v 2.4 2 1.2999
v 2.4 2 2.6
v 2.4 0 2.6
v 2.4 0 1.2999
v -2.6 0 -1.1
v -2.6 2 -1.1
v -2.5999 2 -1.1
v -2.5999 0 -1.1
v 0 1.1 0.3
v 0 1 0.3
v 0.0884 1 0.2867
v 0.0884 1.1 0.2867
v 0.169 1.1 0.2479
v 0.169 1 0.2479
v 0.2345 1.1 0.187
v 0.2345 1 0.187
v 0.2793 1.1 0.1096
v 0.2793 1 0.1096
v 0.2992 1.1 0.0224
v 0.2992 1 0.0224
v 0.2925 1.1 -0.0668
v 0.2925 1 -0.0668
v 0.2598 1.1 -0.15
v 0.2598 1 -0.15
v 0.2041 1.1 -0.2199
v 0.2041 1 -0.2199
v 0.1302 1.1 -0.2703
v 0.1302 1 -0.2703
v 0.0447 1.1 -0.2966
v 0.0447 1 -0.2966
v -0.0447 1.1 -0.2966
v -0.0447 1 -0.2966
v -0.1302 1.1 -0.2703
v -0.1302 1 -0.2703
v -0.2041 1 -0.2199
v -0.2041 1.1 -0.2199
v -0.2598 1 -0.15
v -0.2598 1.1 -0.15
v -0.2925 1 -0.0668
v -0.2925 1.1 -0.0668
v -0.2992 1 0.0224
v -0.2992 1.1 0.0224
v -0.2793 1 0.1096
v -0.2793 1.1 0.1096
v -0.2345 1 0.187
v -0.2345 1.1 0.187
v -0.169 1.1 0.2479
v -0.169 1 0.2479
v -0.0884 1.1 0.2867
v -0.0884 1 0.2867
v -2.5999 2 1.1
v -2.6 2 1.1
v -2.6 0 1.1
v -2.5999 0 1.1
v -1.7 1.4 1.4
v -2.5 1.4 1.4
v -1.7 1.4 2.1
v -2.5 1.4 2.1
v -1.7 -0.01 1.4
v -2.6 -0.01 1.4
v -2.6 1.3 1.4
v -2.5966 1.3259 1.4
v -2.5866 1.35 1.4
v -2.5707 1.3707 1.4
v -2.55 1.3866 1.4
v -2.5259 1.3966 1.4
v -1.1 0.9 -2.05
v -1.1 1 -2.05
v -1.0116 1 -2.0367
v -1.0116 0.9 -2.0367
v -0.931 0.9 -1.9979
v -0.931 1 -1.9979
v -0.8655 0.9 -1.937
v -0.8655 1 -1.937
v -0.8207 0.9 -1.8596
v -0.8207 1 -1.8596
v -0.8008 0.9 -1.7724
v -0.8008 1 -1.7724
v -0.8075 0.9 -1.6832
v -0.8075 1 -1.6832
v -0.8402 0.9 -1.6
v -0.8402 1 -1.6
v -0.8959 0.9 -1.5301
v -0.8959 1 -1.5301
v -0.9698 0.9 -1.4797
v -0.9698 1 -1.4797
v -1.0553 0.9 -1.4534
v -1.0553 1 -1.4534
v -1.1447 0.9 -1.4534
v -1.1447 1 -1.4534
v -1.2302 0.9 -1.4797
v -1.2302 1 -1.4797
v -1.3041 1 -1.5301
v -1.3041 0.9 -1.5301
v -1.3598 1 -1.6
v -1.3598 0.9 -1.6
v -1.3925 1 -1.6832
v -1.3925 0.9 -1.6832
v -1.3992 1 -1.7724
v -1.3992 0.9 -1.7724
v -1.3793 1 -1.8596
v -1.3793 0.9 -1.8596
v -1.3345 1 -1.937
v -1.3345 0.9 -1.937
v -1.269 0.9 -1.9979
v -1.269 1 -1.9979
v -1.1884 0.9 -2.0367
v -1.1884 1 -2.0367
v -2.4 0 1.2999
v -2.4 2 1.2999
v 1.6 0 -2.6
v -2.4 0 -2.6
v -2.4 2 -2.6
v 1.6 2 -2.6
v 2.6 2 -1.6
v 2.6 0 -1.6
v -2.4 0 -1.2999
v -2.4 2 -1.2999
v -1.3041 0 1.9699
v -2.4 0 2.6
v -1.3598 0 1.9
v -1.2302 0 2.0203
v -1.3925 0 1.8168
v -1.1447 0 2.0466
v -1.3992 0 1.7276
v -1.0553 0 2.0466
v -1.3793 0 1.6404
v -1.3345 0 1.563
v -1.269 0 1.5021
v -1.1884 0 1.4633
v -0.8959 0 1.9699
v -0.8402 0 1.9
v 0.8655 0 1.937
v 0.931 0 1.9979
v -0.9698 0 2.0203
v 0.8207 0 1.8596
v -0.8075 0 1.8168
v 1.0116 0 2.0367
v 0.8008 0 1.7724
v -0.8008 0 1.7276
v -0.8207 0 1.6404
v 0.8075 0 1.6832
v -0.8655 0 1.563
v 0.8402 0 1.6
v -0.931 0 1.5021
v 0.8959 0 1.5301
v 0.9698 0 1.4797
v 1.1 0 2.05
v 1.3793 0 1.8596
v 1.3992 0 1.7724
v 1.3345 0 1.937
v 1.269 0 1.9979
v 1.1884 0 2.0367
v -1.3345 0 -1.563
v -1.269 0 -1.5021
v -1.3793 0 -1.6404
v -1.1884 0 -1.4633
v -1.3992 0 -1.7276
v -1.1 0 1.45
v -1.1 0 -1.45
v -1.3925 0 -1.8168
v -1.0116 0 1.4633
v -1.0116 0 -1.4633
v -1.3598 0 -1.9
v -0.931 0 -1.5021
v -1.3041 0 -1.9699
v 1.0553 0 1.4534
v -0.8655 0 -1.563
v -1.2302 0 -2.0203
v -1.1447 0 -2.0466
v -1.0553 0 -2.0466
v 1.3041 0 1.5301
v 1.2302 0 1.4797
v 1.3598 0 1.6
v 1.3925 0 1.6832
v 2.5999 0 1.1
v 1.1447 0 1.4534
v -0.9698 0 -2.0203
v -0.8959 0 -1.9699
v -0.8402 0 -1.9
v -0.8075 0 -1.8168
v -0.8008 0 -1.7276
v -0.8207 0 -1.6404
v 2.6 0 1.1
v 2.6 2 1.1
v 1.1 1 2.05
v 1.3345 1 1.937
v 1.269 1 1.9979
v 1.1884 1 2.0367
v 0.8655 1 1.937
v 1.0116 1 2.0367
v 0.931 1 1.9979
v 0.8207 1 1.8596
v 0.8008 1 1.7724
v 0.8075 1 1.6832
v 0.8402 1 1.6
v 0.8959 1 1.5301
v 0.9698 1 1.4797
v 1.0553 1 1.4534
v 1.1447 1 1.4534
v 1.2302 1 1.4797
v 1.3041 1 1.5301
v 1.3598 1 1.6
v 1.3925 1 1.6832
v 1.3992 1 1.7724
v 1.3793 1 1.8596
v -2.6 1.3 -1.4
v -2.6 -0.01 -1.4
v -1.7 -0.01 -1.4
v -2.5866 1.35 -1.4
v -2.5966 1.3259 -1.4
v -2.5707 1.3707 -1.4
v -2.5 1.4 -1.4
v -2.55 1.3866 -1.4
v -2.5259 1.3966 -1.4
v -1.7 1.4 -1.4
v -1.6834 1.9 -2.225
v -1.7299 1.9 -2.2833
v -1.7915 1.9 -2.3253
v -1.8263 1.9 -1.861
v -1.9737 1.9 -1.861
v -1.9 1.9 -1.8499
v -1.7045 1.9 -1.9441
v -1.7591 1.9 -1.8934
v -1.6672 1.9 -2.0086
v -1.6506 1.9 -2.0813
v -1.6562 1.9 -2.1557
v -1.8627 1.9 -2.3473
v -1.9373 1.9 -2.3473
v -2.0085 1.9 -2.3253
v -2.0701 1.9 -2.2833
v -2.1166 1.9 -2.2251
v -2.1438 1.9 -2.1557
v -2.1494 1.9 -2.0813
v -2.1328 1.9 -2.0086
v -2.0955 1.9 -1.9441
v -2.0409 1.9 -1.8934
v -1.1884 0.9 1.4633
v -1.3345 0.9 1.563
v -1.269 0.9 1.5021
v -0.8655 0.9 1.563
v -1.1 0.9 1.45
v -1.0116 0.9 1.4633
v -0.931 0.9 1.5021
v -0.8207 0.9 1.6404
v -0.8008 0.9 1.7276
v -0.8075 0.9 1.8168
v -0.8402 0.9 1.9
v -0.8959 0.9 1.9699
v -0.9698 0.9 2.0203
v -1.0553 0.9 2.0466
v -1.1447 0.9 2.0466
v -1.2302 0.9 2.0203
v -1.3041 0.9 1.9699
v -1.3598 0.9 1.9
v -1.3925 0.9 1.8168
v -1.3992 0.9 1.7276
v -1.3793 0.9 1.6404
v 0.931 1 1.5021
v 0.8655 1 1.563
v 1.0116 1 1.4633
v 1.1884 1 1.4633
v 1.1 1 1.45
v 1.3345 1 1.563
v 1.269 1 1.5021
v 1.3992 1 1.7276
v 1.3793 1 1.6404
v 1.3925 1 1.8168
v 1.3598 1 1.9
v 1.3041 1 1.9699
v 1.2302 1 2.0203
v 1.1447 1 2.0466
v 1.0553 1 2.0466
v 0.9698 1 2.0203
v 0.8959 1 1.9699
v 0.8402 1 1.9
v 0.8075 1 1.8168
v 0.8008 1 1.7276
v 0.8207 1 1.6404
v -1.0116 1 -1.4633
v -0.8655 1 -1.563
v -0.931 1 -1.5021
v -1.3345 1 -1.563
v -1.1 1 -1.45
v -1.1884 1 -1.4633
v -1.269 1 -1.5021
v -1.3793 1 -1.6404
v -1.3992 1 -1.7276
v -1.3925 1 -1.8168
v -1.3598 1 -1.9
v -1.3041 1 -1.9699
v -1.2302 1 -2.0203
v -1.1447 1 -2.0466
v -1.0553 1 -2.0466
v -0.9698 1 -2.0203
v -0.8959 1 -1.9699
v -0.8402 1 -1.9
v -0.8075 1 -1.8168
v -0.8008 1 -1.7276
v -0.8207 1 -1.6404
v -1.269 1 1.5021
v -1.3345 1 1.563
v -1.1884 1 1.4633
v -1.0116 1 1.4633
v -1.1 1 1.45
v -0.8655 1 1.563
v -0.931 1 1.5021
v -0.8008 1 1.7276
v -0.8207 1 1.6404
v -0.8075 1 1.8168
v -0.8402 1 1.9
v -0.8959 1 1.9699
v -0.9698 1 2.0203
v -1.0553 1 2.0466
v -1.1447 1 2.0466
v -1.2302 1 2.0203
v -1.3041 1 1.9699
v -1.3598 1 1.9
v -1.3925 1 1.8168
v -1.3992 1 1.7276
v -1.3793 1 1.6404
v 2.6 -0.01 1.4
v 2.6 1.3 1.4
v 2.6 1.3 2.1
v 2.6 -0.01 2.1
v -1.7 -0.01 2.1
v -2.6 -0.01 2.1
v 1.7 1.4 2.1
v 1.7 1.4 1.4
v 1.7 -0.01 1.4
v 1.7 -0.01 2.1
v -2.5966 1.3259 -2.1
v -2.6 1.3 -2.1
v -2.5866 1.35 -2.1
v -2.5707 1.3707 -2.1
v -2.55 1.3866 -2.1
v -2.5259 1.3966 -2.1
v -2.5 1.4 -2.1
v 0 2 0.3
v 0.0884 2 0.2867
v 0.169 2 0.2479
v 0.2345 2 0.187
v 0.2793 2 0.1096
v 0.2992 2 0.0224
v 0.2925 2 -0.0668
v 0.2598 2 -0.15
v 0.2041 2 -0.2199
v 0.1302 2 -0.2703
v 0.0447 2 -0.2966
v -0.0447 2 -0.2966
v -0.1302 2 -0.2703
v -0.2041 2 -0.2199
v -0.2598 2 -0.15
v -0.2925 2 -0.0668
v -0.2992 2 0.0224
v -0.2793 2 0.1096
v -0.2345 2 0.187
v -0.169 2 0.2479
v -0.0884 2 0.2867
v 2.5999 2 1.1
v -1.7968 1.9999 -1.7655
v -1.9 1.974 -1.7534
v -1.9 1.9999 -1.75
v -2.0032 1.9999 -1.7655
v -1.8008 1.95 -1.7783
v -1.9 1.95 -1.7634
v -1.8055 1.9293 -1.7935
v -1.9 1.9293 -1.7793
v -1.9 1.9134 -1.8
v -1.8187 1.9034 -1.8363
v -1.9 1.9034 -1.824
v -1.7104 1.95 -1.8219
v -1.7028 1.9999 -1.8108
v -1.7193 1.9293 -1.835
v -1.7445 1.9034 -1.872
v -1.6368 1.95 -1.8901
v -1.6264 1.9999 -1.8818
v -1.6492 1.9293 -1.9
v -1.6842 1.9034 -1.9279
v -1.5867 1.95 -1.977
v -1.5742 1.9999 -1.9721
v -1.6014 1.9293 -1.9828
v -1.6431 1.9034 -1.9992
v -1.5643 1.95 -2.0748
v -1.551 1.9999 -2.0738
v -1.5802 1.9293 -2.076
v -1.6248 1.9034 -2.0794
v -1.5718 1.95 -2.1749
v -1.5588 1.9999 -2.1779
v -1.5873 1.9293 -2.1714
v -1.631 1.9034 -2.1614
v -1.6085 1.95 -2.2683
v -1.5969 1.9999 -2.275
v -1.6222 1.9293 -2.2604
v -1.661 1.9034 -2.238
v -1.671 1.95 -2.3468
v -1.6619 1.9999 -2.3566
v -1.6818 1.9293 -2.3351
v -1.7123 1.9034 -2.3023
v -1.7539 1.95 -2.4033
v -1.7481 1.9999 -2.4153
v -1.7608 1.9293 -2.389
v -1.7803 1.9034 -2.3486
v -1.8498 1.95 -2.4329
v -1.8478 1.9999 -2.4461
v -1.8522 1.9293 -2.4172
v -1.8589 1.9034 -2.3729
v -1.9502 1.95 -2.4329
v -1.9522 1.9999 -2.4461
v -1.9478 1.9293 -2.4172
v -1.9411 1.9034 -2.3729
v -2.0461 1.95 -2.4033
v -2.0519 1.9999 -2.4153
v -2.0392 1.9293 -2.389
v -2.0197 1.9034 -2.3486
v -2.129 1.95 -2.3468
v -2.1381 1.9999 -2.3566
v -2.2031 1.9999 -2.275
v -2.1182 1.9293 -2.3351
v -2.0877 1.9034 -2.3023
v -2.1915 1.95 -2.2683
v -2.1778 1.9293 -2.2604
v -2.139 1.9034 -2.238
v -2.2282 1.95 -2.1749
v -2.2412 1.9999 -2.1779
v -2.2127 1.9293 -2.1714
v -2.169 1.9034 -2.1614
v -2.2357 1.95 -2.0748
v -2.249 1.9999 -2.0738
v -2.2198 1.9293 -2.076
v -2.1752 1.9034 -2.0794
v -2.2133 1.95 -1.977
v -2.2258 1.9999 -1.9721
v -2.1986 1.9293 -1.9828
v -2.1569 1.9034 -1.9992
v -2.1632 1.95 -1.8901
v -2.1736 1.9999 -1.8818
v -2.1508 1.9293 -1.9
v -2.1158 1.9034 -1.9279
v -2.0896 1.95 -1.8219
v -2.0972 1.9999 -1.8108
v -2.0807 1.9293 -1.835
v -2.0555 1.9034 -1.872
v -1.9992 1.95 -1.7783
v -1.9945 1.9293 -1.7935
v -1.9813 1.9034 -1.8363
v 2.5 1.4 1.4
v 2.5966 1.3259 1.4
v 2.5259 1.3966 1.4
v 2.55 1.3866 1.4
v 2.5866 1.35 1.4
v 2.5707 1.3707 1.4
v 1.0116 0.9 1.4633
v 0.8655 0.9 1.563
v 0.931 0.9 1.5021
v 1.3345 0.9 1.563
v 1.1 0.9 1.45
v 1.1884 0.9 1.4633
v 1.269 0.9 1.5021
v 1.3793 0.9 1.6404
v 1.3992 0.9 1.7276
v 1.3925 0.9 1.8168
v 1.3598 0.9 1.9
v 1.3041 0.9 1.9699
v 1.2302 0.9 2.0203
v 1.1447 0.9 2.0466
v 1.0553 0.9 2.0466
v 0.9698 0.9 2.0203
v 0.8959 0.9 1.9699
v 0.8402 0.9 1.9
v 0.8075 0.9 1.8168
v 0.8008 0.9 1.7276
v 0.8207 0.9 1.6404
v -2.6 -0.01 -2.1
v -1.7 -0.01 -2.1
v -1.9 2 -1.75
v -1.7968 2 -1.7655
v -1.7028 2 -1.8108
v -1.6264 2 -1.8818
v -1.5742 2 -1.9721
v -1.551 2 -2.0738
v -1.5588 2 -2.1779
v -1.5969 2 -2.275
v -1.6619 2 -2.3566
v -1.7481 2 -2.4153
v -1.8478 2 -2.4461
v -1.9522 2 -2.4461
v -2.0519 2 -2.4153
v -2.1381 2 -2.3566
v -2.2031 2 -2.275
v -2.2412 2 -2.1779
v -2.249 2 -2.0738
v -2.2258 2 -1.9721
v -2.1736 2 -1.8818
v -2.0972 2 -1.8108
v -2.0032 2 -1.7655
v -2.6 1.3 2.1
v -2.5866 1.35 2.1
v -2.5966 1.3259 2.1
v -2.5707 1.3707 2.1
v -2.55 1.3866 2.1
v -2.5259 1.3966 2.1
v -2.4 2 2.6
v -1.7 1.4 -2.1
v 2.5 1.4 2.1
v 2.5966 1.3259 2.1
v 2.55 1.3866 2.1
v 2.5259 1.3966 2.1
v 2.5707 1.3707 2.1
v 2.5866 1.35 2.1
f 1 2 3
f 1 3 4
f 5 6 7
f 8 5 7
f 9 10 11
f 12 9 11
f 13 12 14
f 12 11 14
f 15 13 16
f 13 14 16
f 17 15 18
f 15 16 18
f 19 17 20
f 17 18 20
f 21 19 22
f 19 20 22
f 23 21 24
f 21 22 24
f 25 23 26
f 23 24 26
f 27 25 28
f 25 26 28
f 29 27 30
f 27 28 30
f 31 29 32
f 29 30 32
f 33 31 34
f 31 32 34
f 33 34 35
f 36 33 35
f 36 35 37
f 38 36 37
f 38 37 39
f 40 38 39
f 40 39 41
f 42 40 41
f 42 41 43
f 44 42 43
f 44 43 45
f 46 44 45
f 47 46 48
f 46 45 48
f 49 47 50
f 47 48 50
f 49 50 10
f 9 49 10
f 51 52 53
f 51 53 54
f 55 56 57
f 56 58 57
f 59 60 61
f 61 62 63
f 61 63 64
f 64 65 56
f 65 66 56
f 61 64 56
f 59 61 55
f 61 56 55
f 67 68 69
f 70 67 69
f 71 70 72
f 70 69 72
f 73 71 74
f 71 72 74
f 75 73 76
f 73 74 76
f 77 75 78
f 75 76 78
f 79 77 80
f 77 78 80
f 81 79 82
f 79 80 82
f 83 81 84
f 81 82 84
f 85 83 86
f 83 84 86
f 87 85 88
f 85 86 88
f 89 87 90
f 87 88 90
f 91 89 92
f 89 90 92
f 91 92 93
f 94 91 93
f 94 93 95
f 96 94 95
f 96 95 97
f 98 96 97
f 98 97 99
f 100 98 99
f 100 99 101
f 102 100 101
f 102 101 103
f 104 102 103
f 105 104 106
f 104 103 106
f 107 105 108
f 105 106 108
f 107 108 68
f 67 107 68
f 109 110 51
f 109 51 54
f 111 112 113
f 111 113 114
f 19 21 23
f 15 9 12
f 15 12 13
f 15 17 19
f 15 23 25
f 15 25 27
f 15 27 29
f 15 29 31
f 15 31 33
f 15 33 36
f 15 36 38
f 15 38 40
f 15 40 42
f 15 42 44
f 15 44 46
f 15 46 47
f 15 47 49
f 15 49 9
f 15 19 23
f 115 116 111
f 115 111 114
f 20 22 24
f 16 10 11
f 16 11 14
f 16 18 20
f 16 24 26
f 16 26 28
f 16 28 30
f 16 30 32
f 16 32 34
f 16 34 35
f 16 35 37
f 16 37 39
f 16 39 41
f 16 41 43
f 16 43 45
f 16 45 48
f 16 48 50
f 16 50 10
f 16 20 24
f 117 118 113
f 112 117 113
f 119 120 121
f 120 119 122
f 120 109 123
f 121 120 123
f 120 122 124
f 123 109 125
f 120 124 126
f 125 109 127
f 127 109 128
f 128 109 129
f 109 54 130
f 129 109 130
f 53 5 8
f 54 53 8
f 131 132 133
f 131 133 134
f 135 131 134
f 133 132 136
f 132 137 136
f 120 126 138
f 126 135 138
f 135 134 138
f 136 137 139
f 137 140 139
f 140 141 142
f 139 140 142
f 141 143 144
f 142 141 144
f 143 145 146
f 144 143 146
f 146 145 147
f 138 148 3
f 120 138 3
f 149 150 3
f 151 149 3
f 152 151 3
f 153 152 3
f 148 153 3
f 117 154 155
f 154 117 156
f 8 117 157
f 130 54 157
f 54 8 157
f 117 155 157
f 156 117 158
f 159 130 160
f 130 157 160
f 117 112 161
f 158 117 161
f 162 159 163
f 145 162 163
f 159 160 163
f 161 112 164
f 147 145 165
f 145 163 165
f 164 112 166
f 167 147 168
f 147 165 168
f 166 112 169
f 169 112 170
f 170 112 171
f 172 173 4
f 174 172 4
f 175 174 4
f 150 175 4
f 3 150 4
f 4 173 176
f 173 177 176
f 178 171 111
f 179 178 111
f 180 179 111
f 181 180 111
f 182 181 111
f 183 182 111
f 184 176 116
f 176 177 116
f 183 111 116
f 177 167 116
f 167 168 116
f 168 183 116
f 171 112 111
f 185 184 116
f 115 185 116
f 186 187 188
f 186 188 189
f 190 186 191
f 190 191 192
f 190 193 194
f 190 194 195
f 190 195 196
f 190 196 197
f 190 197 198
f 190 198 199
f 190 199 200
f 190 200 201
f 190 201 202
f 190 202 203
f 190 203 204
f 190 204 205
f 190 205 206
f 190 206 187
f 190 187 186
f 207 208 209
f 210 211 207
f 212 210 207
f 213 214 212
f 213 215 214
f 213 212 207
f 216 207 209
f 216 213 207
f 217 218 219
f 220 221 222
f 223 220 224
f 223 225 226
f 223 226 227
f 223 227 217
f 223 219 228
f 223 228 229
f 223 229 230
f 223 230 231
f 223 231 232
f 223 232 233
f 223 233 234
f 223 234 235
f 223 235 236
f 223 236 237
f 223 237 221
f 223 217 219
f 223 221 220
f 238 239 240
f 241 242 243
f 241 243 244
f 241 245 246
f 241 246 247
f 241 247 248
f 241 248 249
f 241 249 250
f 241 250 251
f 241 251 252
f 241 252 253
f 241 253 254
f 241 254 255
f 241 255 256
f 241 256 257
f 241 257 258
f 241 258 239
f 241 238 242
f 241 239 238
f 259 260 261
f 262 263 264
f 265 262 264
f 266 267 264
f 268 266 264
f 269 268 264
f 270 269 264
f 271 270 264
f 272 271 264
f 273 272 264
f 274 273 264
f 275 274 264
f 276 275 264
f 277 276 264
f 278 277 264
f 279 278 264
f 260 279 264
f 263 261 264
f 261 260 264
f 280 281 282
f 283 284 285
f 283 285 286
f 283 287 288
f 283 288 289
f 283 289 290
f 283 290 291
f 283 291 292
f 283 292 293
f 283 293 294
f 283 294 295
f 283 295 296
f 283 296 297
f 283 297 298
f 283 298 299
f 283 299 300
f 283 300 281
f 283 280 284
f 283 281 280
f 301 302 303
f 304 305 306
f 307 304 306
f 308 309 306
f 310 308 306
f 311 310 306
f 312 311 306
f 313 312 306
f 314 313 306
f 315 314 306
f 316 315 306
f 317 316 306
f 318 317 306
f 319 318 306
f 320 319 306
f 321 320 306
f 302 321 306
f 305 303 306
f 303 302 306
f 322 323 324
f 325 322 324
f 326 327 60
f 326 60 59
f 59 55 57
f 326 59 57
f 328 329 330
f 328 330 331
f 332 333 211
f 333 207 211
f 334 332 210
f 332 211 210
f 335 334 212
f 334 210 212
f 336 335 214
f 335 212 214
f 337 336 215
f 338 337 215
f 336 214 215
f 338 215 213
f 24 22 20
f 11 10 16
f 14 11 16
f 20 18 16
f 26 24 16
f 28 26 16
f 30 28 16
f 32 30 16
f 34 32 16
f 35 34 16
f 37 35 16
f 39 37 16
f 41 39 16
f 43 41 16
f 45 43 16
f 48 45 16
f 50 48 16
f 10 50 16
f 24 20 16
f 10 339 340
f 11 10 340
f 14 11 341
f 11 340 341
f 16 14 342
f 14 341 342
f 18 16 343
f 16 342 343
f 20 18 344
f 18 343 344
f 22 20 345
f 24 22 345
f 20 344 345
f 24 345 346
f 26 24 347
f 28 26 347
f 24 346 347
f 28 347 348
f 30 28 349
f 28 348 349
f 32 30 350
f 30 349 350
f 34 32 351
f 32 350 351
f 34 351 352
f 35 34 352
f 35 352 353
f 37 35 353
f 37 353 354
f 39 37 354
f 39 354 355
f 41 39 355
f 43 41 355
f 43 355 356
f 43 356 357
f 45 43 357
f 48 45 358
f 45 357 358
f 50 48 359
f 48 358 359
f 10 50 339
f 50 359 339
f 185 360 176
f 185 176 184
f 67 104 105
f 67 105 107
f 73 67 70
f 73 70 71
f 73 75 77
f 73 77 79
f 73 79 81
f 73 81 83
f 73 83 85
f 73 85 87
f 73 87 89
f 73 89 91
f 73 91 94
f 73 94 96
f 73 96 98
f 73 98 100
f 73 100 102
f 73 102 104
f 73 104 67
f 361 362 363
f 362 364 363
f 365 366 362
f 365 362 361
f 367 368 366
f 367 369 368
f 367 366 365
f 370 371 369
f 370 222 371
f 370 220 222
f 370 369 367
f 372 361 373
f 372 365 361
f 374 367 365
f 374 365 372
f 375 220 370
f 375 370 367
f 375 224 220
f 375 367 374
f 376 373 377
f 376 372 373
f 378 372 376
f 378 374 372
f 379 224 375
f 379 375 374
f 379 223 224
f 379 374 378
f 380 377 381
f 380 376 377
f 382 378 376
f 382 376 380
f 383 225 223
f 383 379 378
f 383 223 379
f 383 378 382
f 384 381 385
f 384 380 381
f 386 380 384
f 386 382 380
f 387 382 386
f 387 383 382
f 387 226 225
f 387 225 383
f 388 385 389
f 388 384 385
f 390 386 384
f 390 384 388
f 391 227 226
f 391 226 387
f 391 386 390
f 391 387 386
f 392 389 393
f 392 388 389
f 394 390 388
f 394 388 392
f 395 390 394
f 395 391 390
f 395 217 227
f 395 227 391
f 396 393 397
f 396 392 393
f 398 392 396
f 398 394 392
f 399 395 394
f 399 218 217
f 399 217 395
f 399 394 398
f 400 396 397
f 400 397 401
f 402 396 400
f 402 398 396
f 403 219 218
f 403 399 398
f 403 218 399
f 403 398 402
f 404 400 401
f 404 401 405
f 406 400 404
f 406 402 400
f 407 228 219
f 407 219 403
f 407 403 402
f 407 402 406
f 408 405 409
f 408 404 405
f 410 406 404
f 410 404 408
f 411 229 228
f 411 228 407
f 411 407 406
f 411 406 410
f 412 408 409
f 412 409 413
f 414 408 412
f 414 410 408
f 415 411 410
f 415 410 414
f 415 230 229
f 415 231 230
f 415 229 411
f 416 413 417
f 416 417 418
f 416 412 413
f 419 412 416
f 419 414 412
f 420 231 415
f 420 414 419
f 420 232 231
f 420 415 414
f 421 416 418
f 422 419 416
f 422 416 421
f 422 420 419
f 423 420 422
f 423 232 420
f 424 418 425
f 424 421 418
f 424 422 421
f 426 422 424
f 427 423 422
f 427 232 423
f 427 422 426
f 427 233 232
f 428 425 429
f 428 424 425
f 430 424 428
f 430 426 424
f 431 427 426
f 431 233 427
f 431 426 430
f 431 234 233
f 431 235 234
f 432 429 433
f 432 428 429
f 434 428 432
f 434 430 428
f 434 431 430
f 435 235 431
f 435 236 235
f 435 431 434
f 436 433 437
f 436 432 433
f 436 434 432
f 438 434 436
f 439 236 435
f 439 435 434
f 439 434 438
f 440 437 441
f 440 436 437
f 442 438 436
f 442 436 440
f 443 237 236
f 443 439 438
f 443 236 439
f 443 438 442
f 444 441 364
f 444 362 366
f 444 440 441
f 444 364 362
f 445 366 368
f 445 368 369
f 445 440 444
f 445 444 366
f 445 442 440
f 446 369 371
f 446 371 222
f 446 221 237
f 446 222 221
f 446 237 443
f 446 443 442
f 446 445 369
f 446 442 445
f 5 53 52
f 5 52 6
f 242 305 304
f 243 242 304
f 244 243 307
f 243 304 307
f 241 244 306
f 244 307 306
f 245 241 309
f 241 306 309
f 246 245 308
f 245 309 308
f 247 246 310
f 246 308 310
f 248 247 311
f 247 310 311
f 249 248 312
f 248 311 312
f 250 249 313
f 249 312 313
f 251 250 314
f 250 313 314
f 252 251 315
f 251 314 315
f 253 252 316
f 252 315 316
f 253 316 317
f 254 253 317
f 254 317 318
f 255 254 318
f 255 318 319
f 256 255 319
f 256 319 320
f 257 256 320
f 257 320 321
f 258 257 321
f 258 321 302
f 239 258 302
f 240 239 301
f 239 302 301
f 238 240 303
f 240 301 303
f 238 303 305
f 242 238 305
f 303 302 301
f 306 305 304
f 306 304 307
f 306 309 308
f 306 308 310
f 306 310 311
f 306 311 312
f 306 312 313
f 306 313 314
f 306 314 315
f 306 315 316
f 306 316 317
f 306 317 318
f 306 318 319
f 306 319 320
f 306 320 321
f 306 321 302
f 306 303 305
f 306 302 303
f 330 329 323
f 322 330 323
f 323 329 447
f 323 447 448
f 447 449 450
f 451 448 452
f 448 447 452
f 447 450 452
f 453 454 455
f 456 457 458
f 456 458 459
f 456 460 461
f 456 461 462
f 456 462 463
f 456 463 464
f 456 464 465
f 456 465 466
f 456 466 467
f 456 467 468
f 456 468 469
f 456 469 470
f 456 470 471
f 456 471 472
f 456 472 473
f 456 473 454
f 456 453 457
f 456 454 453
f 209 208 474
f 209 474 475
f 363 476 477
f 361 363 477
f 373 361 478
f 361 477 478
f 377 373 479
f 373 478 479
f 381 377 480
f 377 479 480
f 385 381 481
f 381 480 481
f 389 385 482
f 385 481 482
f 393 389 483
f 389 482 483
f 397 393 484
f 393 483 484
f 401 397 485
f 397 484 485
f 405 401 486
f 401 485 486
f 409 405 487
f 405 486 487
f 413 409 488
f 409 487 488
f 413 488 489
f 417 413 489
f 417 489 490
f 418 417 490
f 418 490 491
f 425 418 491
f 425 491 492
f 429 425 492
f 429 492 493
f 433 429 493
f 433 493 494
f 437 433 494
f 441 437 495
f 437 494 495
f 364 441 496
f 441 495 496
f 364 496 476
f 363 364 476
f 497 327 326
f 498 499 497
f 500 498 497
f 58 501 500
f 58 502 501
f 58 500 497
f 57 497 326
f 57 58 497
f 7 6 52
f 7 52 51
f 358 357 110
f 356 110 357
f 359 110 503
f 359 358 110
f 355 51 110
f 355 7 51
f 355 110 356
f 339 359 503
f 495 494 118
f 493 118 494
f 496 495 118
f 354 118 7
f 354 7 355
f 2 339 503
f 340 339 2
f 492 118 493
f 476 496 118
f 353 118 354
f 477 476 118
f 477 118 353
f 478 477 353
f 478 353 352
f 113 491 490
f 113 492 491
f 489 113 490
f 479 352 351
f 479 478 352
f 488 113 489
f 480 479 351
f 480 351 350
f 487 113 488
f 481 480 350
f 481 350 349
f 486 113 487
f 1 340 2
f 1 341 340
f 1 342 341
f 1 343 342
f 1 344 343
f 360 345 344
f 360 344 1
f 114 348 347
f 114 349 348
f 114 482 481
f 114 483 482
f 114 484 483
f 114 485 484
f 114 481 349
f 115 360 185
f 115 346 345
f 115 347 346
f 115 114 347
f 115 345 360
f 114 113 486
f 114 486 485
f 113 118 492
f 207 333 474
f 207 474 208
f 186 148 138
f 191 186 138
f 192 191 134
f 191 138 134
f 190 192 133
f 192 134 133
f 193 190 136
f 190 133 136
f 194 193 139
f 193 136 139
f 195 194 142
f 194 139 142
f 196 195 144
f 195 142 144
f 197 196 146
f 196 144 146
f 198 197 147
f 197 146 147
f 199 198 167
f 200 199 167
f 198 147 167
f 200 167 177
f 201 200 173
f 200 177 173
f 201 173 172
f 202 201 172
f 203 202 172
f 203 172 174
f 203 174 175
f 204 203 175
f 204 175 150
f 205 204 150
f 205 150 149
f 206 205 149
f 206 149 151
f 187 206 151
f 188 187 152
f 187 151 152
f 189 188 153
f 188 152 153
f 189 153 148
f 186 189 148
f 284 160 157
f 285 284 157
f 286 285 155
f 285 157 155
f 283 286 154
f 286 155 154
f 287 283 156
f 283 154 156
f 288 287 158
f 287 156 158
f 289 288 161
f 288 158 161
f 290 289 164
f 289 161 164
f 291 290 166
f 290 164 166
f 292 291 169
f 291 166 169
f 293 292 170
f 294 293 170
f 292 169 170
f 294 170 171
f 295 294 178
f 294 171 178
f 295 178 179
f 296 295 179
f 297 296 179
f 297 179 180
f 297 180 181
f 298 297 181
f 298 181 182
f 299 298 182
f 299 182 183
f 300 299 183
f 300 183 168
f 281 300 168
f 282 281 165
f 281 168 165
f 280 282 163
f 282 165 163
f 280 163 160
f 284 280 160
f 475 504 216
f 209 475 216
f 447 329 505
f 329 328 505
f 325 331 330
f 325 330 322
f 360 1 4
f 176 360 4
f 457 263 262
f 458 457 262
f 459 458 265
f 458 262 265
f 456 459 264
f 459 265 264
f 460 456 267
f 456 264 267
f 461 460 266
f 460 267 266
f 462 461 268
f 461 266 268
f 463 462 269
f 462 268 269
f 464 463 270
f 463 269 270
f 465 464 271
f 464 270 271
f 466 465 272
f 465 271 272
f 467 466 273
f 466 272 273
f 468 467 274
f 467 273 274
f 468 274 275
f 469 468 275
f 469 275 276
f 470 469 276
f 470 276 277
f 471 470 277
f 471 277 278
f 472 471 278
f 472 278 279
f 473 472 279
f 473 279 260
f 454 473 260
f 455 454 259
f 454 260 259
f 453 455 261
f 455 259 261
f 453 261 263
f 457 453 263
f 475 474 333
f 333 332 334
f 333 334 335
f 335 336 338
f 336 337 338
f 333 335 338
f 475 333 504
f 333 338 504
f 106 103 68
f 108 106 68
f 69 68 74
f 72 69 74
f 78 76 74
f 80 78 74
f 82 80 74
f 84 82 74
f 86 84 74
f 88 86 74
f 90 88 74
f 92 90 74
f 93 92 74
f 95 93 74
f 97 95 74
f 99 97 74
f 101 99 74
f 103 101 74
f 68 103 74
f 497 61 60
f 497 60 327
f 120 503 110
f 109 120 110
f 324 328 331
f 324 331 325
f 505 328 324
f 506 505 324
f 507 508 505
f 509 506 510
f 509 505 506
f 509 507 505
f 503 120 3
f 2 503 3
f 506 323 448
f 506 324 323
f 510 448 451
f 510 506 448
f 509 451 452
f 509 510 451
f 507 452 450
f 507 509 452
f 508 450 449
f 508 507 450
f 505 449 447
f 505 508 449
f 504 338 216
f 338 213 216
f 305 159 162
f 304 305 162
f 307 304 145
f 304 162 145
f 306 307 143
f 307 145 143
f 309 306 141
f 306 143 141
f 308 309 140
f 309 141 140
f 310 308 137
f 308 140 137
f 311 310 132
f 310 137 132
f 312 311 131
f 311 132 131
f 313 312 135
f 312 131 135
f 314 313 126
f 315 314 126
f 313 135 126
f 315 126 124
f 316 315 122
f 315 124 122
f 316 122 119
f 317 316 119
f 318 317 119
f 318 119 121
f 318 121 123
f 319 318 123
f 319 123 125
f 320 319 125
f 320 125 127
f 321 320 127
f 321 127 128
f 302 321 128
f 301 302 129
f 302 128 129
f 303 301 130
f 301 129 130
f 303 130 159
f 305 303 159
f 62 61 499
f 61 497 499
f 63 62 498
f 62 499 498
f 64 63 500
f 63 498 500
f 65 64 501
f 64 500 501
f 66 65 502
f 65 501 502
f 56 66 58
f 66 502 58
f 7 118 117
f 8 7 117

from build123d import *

# Parameters (mm, degrees)
SKETCH_1_W             = 5.2
SKETCH_1_H             = 5.2
EXTRUDE_1_DEPTH        = 2
SKETCH_2_W             = 0.2
SKETCH_2_H             = 1.5
CUT_EXTRUDE_1_DEPTH    = 5.185689907
CHAMFER_1_SIZE         = 0.2
CHAMFER_2_SIZE         = 1
SKETCH_3_R             = 0.3
CUT_EXTRUDE_2_DEPTH    = 1
SKETCH_4_R             = 0.3
EXTRUDE_2_DEPTH        = 0.1
SKETCH_5_R             = 0.35
CUT_EXTRUDE_3_DEPTH    = 0.1
FILLET_1_R             = 0.1
EXTRUDE_3_DEPTH        = 0.01
EXTRUDE_3_DEPTH_BACK   = 1.4
SKETCH_6_W             = 0.9
SKETCH_6_H             = 0.7
EXTRUDE_3_2_DEPTH      = 0.01
EXTRUDE_3_2_DEPTH_BACK = 1.4
EXTRUDE_3_3_DEPTH      = 0.01
EXTRUDE_3_3_DEPTH_BACK = 1.4
SKETCH_7_R             = 0.3
CUT_EXTRUDE_4_DEPTH    = 1
SKETCH_8_R             = 0.3
EXTRUDE_4_DEPTH        = 0.1
EXTRUDE_4_2_DEPTH      = 0.1
EXTRUDE_4_3_DEPTH      = 0.1
FILLET_2_R             = 0.1
FILLET_3_R             = 0.1
FILLET_4_R             = 0.1


with BuildPart() as part:
    # 草图1 → 凸台-拉伸1 (new body)
    with BuildSketch(Plane(origin=(0, 0, 0), x_dir=(1, 0, 0), z_dir=(0, 1, 0))):
        Rectangle(SKETCH_1_W, SKETCH_1_H)
    extrude(amount=EXTRUDE_1_DEPTH)

    # 草图2 → 切除-拉伸1 (cut, through all)
    with BuildSketch(Plane(origin=(0, 2, 0), x_dir=(1, 0, 0), z_dir=(0, 1, 0))):
        with Locations((-2.5, -1.85)):
            Rectangle(SKETCH_2_W, SKETCH_2_H)
        with Locations((-2.5, 1.85)):
            Rectangle(SKETCH_2_W, SKETCH_2_H)
        with Locations((2.5, -1.85)):
            Rectangle(SKETCH_2_W, SKETCH_2_H)
    extrude(amount=-CUT_EXTRUDE_1_DEPTH, mode=Mode.SUBTRACT)

    # 倒角1
    chamfer_1_edges = [part.edges().sort_by_distance(p)[0] for p in [
        (2.4, 1, 1.1),
        (-2.4, 1, -1.1),
        (-2.4, 1, 1.1),
    ]]
    chamfer(chamfer_1_edges, length=CHAMFER_1_SIZE - 0.0001)  # a hair under: the kernel refuses the full size

    # 倒角2
    chamfer_2_edges = [part.edges().sort_by_distance(p)[0] for p in [
        (2.6, 1, -2.6),
    ]]
    chamfer(chamfer_2_edges, length=CHAMFER_2_SIZE)

    # 草图3 → 切除-拉伸2 (cut)
    with BuildSketch(Plane(origin=(0, 2, 0), x_dir=(1, 0, 0), z_dir=(0, 1, 0))):
        with Locations(Location((0, 0, 0), (0, 0, 270))):
            Circle(SKETCH_3_R)
    extrude(amount=-CUT_EXTRUDE_2_DEPTH, mode=Mode.SUBTRACT)

    # 草图5 → 切除-拉伸3 (cut)
    with BuildSketch(Plane(origin=(0, 2, 0), x_dir=(1, 0, 0), z_dir=(0, 1, 0))):
        with Locations(Location((-1.9, 2.1, 0), (0, 0, 270))):
            Circle(SKETCH_5_R)
    extrude(amount=-CUT_EXTRUDE_3_DEPTH, mode=Mode.SUBTRACT)

    # 圆角1
    fillet_1_edges = [part.edges().sort_by_distance(p)[0] for p in [
        (-1.9, 1.9, -2.45),
    ]]
    fillet(fillet_1_edges, radius=FILLET_1_R - 0.0001)  # a hair under: the kernel refuses the full size

    # 草图7 → 切除-拉伸4 (cut)
    with BuildSketch(Plane.XZ):
        with Locations(Location((-1.1, 1.75, 0), (0, 0, 270))):
            Circle(SKETCH_7_R)
        with Locations(Location((-1.1, -1.75, 0), (0, 0, 90))):
            Circle(SKETCH_7_R)
        with Locations(Location((1.1, 1.75, 0), (0, 0, 90))):
            Circle(SKETCH_7_R)
    extrude(amount=-CUT_EXTRUDE_4_DEPTH, mode=Mode.SUBTRACT)


with BuildPart() as body_2:
    # 草图4 → 凸台-拉伸2 (new body)
    with BuildSketch(Plane(origin=(0, 1, 0), x_dir=(1, 0, 0), z_dir=(0, 1, 0))):
        with Locations(Location((0, 0, 0), (0, 0, 270))):
            Circle(SKETCH_4_R)
    extrude(amount=EXTRUDE_2_DEPTH)


with BuildPart() as body_3:
    # 草图6 → 凸台-拉伸3 (new, two sides: drawn at the far end of the back side and taken through both)
    with BuildSketch(Plane.XZ.offset(-EXTRUDE_3_DEPTH_BACK)):
        with Locations((2.15, 1.75)):
            Rectangle(SKETCH_6_W, SKETCH_6_H)
    extrude(amount=EXTRUDE_3_DEPTH + EXTRUDE_3_DEPTH_BACK)

    # 圆角4
    fillet_4_edges = [body_3.edges().sort_by_distance(p)[0] for p in [
        (2.6, 1.4, 1.75),
    ]]
    fillet(fillet_4_edges, radius=FILLET_4_R)


with BuildPart() as body_4:
    # 草图6 → Extrude 3 2 (new, two sides: drawn at the far end of the back side and taken through both)
    with BuildSketch(Plane.XZ.offset(-EXTRUDE_3_2_DEPTH_BACK)):
        with Locations((-2.15, 1.75)):
            Rectangle(SKETCH_6_W, SKETCH_6_H)
    extrude(amount=EXTRUDE_3_2_DEPTH + EXTRUDE_3_2_DEPTH_BACK)

    # 圆角3
    fillet_3_edges = [body_4.edges().sort_by_distance(p)[0] for p in [
        (-2.6, 1.4, 1.75),
    ]]
    fillet(fillet_3_edges, radius=FILLET_3_R)


with BuildPart() as body_5:
    # 草图6 → Extrude 3 3 (new, two sides: drawn at the far end of the back side and taken through both)
    with BuildSketch(Plane.XZ.offset(-EXTRUDE_3_3_DEPTH_BACK)):
        with Locations((-2.15, -1.75)):
            Rectangle(SKETCH_6_W, SKETCH_6_H)
    extrude(amount=EXTRUDE_3_3_DEPTH + EXTRUDE_3_3_DEPTH_BACK)

    # 圆角2
    fillet_2_edges = [body_5.edges().sort_by_distance(p)[0] for p in [
        (-2.6, 1.4, -1.75),
    ]]
    fillet(fillet_2_edges, radius=FILLET_2_R)


with BuildPart() as body_6:
    # 草图8 → 凸台-拉伸4 (new body)
    with BuildSketch(Plane.XZ.offset(-1)):
        with Locations(Location((1.1, 1.75, 0), (0, 0, 270))):
            Circle(SKETCH_8_R)
    extrude(amount=EXTRUDE_4_DEPTH)


with BuildPart() as body_7:
    # 草图8 → Extrude 4 2 (new body)
    with BuildSketch(Plane.XZ.offset(-1)):
        with Locations(Location((-1.1, 1.75, 0), (0, 0, 270))):
            Circle(SKETCH_8_R)
    extrude(amount=EXTRUDE_4_2_DEPTH)


with BuildPart() as body_8:
    # 草图8 → Extrude 4 3 (new body)
    with BuildSketch(Plane.XZ.offset(-1)):
        with Locations(Location((-1.1, -1.75, 0), (0, 0, 270))):
            Circle(SKETCH_8_R)
    extrude(amount=EXTRUDE_4_3_DEPTH)


solid = Compound([part.part, body_2.part, body_3.part, body_4.part, body_5.part, body_6.part, body_7.part, body_8.part])
